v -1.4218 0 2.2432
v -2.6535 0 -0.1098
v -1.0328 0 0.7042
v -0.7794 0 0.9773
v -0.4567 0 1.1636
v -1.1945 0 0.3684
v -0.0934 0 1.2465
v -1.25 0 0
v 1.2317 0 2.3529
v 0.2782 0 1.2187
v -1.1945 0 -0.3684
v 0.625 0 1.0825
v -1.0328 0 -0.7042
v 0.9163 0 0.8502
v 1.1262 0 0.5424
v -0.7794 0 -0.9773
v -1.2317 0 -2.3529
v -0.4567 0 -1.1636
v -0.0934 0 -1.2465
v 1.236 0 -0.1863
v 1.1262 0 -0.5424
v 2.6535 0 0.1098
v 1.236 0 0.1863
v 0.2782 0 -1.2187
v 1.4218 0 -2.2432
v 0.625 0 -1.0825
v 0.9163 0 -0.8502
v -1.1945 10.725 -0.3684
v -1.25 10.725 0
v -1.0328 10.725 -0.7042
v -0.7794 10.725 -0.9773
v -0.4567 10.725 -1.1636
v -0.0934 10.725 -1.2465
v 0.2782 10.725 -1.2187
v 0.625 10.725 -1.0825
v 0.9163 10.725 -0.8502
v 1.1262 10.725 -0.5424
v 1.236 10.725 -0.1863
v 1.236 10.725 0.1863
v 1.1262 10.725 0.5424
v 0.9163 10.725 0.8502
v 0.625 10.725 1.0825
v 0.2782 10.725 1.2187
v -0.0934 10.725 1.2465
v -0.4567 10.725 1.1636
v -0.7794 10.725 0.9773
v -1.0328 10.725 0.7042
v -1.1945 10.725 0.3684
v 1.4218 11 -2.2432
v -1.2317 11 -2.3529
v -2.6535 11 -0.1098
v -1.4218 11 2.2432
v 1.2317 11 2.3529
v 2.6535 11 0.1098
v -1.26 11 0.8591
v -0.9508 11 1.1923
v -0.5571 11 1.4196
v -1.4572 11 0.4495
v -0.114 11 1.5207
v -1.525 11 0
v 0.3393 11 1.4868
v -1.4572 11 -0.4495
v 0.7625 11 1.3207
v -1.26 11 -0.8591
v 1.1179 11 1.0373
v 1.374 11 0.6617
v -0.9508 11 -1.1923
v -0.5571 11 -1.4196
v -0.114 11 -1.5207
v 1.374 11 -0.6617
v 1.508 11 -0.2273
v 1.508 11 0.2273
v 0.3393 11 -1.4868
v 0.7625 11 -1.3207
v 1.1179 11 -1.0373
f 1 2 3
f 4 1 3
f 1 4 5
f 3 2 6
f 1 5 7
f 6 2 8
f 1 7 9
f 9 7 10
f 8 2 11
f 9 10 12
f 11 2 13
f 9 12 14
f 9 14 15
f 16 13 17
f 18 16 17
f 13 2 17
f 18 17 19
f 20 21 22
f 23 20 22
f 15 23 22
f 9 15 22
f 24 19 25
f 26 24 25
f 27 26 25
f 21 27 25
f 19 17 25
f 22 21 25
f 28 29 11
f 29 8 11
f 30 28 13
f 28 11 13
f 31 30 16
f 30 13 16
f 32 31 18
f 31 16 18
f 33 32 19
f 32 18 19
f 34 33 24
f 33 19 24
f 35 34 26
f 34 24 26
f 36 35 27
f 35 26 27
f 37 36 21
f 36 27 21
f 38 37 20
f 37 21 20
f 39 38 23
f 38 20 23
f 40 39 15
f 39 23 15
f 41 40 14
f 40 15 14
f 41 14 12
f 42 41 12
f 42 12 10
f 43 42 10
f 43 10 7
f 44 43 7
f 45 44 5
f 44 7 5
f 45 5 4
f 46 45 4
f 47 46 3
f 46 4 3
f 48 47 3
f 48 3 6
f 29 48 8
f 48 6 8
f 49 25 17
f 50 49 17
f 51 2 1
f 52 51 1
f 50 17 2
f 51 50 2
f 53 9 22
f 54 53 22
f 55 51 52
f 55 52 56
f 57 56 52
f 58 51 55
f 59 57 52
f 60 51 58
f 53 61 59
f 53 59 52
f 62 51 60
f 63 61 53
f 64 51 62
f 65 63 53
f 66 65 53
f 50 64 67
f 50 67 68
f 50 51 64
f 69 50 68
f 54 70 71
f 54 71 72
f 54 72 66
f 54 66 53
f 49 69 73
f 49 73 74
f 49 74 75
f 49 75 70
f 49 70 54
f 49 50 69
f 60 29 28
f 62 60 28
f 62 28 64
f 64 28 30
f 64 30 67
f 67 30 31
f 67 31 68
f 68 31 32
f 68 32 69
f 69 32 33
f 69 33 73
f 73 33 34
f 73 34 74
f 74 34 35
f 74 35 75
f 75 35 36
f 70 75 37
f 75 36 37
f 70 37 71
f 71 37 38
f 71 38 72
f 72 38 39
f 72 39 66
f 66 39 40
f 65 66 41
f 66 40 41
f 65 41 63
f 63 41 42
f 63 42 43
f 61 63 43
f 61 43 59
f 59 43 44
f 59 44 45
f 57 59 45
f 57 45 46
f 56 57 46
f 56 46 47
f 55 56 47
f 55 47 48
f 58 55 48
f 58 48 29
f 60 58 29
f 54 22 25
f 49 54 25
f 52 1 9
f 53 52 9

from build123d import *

# Parameters (mm, degrees)
SKETCH_1_R                   = 1.1
EXTRUDE_1_DEPTH              = 11
HOLE_WIZARD_M3_2_D           = 2.5
HOLE_WIZARD_M3_2_CSINK_D     = 3.05
HOLE_WIZARD_M3_2_CSINK_ANGLE = 90


with BuildPart() as part:
    # 草图1 → 凸台-拉伸1 (new body)
    with BuildSketch(Plane(origin=(0, 0, 0), x_dir=(1, 0, 0), z_dir=(0, 1, 0))):
        Polygon((1.231724884, -2.352910356), (2.653542583, -0.109750138), (1.421817699, 2.243160218), (-1.231724884, 2.352910356), (-2.653542583, 0.109750138), (-1.421817699, -2.243160218), align=None)
        Circle(SKETCH_1_R, mode=Mode.SUBTRACT)
    extrude(amount=EXTRUDE_1_DEPTH)

    # M3 螺纹孔2 (through all)
    with Locations(Plane(origin=(0, 11, 0), x_dir=(1, 0, 0), z_dir=(0, 1, 0))):
        with Locations((0, 0)):
            CounterSinkHole(HOLE_WIZARD_M3_2_D / 2, HOLE_WIZARD_M3_2_CSINK_D / 2, counter_sink_angle=HOLE_WIZARD_M3_2_CSINK_ANGLE)


solid = part.part
